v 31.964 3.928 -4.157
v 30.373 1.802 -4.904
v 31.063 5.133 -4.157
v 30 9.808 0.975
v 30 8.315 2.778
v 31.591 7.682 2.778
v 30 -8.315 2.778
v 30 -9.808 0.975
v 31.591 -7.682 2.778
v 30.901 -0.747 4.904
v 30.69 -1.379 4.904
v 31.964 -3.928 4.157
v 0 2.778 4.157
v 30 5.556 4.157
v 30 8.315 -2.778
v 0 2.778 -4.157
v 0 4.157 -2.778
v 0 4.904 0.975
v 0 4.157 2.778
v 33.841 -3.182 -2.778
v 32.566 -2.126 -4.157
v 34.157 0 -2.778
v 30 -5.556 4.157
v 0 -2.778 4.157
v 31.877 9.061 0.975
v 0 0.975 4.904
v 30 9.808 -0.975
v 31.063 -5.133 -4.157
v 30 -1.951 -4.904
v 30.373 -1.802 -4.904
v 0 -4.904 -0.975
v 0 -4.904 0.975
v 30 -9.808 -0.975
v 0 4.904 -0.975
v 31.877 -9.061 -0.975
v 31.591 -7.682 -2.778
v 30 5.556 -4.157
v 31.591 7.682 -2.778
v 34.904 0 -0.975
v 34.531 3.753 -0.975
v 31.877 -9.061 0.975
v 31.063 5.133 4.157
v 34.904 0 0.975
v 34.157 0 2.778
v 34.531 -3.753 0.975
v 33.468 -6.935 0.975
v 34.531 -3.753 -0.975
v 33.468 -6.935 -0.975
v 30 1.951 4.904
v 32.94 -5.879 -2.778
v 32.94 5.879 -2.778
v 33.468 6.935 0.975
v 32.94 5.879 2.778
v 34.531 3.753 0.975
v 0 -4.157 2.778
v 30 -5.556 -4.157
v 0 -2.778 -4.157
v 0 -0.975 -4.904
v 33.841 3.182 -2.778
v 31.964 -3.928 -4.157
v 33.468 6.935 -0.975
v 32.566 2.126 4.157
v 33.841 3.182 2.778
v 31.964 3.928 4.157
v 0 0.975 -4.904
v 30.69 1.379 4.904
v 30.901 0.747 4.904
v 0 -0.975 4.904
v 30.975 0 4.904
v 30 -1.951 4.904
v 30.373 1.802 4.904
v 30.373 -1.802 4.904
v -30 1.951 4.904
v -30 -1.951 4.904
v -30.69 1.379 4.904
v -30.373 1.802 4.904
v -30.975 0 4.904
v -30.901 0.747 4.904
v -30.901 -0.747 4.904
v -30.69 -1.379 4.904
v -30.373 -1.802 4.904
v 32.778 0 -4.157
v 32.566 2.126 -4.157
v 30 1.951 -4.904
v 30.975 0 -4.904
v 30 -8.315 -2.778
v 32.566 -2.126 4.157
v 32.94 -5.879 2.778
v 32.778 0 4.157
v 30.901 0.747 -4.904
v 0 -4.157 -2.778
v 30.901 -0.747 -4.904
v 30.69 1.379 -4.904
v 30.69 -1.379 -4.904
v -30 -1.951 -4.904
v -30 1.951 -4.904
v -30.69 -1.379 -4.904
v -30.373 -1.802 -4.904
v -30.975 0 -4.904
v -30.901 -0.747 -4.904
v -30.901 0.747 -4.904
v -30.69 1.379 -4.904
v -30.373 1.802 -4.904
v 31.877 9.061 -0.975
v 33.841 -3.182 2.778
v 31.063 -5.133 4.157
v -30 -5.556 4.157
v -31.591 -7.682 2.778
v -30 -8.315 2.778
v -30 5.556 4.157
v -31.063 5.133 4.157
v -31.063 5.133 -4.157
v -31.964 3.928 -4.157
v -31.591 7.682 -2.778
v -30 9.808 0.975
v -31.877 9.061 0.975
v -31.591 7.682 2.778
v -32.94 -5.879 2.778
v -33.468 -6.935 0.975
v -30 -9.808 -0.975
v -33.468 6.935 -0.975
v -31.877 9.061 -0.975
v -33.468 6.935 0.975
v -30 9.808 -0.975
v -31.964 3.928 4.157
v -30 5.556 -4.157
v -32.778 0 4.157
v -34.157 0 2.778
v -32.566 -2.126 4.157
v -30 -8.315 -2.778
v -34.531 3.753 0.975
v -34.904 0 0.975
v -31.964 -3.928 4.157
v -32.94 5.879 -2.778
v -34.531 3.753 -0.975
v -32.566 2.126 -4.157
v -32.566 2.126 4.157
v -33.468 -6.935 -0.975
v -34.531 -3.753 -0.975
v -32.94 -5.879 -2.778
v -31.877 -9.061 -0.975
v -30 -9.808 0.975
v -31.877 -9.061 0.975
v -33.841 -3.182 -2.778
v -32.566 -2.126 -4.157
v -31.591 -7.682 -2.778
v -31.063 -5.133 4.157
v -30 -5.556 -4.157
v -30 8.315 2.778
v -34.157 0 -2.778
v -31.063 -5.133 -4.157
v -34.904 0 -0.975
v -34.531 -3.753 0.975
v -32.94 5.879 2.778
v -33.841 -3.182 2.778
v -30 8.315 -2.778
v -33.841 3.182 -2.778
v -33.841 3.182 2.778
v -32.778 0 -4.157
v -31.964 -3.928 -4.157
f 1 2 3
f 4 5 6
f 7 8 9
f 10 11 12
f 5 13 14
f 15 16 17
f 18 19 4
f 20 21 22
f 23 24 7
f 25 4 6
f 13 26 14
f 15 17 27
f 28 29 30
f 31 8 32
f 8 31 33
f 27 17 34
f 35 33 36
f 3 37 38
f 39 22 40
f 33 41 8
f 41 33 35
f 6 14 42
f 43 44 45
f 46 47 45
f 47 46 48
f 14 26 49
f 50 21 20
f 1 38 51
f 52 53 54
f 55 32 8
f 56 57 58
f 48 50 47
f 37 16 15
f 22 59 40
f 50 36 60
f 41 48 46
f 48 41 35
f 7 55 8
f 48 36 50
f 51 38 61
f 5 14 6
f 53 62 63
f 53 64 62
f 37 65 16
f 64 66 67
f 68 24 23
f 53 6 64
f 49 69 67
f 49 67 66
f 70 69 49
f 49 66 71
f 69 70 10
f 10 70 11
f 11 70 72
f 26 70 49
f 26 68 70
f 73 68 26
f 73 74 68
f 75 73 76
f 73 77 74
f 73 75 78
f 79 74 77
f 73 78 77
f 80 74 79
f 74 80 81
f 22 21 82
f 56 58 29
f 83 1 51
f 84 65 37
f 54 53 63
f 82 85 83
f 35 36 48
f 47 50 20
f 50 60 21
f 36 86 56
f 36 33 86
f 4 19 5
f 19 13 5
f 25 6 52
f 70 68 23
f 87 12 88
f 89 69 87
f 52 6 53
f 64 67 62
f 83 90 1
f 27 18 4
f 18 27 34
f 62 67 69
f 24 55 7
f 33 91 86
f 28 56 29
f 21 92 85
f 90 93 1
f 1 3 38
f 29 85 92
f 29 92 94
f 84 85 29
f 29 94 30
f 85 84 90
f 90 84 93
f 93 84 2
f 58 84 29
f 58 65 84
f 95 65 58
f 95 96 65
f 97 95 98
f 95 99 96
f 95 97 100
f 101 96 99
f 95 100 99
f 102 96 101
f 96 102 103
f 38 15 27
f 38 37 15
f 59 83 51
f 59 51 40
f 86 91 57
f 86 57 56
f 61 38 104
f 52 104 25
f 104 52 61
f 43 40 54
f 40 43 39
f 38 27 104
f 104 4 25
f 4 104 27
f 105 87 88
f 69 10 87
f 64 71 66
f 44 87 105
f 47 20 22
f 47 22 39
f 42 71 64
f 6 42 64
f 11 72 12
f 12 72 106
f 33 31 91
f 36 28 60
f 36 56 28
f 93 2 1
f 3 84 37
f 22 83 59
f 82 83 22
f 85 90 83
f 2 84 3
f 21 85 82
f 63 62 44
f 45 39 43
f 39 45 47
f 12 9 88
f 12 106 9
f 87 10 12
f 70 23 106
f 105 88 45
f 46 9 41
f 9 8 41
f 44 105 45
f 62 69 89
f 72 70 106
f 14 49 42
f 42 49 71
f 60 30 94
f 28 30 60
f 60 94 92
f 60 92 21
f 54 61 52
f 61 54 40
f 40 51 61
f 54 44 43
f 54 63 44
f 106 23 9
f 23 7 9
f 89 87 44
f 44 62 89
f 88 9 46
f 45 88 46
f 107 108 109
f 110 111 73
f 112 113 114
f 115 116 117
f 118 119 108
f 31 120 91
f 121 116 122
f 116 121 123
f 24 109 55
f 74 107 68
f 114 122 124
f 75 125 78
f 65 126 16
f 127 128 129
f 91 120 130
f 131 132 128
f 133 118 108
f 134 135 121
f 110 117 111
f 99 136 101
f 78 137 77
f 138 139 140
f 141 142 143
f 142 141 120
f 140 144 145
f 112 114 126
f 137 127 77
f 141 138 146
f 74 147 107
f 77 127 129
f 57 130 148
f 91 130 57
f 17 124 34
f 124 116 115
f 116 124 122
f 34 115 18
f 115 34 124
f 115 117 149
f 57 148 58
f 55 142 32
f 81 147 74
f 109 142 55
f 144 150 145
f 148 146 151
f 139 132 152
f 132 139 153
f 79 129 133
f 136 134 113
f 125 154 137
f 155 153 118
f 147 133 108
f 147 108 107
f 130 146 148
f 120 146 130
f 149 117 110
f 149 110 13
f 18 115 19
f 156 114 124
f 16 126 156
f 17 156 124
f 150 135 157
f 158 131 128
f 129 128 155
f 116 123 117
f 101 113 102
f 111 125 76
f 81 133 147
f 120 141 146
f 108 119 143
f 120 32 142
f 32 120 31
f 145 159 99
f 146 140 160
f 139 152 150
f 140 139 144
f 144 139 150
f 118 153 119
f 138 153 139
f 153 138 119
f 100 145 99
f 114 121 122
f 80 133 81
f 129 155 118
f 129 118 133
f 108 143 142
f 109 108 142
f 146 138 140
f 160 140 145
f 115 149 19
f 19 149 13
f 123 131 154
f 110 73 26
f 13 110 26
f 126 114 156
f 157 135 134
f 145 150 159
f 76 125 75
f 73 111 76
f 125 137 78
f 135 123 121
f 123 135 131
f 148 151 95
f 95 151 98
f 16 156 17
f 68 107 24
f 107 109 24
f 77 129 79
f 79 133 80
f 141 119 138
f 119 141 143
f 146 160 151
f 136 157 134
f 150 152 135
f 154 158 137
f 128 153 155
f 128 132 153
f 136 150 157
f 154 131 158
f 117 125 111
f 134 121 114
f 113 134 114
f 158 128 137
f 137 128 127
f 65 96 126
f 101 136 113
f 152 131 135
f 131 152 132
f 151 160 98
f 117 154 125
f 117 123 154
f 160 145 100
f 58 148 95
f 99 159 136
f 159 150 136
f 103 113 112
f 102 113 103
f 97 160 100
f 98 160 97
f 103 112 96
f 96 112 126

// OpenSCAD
// Use this code in the OpenSCAD editor window
knot_size = 10;
wing_length = 30;

module wing() {
    hull() {
        sphere(d=knot_size);
        translate([wing_length, 0, 0]) 
            scale([1, 2, 1]) sphere(d=knot_size);
    }
}

wing();
mirror([1,0,0]) wing();
